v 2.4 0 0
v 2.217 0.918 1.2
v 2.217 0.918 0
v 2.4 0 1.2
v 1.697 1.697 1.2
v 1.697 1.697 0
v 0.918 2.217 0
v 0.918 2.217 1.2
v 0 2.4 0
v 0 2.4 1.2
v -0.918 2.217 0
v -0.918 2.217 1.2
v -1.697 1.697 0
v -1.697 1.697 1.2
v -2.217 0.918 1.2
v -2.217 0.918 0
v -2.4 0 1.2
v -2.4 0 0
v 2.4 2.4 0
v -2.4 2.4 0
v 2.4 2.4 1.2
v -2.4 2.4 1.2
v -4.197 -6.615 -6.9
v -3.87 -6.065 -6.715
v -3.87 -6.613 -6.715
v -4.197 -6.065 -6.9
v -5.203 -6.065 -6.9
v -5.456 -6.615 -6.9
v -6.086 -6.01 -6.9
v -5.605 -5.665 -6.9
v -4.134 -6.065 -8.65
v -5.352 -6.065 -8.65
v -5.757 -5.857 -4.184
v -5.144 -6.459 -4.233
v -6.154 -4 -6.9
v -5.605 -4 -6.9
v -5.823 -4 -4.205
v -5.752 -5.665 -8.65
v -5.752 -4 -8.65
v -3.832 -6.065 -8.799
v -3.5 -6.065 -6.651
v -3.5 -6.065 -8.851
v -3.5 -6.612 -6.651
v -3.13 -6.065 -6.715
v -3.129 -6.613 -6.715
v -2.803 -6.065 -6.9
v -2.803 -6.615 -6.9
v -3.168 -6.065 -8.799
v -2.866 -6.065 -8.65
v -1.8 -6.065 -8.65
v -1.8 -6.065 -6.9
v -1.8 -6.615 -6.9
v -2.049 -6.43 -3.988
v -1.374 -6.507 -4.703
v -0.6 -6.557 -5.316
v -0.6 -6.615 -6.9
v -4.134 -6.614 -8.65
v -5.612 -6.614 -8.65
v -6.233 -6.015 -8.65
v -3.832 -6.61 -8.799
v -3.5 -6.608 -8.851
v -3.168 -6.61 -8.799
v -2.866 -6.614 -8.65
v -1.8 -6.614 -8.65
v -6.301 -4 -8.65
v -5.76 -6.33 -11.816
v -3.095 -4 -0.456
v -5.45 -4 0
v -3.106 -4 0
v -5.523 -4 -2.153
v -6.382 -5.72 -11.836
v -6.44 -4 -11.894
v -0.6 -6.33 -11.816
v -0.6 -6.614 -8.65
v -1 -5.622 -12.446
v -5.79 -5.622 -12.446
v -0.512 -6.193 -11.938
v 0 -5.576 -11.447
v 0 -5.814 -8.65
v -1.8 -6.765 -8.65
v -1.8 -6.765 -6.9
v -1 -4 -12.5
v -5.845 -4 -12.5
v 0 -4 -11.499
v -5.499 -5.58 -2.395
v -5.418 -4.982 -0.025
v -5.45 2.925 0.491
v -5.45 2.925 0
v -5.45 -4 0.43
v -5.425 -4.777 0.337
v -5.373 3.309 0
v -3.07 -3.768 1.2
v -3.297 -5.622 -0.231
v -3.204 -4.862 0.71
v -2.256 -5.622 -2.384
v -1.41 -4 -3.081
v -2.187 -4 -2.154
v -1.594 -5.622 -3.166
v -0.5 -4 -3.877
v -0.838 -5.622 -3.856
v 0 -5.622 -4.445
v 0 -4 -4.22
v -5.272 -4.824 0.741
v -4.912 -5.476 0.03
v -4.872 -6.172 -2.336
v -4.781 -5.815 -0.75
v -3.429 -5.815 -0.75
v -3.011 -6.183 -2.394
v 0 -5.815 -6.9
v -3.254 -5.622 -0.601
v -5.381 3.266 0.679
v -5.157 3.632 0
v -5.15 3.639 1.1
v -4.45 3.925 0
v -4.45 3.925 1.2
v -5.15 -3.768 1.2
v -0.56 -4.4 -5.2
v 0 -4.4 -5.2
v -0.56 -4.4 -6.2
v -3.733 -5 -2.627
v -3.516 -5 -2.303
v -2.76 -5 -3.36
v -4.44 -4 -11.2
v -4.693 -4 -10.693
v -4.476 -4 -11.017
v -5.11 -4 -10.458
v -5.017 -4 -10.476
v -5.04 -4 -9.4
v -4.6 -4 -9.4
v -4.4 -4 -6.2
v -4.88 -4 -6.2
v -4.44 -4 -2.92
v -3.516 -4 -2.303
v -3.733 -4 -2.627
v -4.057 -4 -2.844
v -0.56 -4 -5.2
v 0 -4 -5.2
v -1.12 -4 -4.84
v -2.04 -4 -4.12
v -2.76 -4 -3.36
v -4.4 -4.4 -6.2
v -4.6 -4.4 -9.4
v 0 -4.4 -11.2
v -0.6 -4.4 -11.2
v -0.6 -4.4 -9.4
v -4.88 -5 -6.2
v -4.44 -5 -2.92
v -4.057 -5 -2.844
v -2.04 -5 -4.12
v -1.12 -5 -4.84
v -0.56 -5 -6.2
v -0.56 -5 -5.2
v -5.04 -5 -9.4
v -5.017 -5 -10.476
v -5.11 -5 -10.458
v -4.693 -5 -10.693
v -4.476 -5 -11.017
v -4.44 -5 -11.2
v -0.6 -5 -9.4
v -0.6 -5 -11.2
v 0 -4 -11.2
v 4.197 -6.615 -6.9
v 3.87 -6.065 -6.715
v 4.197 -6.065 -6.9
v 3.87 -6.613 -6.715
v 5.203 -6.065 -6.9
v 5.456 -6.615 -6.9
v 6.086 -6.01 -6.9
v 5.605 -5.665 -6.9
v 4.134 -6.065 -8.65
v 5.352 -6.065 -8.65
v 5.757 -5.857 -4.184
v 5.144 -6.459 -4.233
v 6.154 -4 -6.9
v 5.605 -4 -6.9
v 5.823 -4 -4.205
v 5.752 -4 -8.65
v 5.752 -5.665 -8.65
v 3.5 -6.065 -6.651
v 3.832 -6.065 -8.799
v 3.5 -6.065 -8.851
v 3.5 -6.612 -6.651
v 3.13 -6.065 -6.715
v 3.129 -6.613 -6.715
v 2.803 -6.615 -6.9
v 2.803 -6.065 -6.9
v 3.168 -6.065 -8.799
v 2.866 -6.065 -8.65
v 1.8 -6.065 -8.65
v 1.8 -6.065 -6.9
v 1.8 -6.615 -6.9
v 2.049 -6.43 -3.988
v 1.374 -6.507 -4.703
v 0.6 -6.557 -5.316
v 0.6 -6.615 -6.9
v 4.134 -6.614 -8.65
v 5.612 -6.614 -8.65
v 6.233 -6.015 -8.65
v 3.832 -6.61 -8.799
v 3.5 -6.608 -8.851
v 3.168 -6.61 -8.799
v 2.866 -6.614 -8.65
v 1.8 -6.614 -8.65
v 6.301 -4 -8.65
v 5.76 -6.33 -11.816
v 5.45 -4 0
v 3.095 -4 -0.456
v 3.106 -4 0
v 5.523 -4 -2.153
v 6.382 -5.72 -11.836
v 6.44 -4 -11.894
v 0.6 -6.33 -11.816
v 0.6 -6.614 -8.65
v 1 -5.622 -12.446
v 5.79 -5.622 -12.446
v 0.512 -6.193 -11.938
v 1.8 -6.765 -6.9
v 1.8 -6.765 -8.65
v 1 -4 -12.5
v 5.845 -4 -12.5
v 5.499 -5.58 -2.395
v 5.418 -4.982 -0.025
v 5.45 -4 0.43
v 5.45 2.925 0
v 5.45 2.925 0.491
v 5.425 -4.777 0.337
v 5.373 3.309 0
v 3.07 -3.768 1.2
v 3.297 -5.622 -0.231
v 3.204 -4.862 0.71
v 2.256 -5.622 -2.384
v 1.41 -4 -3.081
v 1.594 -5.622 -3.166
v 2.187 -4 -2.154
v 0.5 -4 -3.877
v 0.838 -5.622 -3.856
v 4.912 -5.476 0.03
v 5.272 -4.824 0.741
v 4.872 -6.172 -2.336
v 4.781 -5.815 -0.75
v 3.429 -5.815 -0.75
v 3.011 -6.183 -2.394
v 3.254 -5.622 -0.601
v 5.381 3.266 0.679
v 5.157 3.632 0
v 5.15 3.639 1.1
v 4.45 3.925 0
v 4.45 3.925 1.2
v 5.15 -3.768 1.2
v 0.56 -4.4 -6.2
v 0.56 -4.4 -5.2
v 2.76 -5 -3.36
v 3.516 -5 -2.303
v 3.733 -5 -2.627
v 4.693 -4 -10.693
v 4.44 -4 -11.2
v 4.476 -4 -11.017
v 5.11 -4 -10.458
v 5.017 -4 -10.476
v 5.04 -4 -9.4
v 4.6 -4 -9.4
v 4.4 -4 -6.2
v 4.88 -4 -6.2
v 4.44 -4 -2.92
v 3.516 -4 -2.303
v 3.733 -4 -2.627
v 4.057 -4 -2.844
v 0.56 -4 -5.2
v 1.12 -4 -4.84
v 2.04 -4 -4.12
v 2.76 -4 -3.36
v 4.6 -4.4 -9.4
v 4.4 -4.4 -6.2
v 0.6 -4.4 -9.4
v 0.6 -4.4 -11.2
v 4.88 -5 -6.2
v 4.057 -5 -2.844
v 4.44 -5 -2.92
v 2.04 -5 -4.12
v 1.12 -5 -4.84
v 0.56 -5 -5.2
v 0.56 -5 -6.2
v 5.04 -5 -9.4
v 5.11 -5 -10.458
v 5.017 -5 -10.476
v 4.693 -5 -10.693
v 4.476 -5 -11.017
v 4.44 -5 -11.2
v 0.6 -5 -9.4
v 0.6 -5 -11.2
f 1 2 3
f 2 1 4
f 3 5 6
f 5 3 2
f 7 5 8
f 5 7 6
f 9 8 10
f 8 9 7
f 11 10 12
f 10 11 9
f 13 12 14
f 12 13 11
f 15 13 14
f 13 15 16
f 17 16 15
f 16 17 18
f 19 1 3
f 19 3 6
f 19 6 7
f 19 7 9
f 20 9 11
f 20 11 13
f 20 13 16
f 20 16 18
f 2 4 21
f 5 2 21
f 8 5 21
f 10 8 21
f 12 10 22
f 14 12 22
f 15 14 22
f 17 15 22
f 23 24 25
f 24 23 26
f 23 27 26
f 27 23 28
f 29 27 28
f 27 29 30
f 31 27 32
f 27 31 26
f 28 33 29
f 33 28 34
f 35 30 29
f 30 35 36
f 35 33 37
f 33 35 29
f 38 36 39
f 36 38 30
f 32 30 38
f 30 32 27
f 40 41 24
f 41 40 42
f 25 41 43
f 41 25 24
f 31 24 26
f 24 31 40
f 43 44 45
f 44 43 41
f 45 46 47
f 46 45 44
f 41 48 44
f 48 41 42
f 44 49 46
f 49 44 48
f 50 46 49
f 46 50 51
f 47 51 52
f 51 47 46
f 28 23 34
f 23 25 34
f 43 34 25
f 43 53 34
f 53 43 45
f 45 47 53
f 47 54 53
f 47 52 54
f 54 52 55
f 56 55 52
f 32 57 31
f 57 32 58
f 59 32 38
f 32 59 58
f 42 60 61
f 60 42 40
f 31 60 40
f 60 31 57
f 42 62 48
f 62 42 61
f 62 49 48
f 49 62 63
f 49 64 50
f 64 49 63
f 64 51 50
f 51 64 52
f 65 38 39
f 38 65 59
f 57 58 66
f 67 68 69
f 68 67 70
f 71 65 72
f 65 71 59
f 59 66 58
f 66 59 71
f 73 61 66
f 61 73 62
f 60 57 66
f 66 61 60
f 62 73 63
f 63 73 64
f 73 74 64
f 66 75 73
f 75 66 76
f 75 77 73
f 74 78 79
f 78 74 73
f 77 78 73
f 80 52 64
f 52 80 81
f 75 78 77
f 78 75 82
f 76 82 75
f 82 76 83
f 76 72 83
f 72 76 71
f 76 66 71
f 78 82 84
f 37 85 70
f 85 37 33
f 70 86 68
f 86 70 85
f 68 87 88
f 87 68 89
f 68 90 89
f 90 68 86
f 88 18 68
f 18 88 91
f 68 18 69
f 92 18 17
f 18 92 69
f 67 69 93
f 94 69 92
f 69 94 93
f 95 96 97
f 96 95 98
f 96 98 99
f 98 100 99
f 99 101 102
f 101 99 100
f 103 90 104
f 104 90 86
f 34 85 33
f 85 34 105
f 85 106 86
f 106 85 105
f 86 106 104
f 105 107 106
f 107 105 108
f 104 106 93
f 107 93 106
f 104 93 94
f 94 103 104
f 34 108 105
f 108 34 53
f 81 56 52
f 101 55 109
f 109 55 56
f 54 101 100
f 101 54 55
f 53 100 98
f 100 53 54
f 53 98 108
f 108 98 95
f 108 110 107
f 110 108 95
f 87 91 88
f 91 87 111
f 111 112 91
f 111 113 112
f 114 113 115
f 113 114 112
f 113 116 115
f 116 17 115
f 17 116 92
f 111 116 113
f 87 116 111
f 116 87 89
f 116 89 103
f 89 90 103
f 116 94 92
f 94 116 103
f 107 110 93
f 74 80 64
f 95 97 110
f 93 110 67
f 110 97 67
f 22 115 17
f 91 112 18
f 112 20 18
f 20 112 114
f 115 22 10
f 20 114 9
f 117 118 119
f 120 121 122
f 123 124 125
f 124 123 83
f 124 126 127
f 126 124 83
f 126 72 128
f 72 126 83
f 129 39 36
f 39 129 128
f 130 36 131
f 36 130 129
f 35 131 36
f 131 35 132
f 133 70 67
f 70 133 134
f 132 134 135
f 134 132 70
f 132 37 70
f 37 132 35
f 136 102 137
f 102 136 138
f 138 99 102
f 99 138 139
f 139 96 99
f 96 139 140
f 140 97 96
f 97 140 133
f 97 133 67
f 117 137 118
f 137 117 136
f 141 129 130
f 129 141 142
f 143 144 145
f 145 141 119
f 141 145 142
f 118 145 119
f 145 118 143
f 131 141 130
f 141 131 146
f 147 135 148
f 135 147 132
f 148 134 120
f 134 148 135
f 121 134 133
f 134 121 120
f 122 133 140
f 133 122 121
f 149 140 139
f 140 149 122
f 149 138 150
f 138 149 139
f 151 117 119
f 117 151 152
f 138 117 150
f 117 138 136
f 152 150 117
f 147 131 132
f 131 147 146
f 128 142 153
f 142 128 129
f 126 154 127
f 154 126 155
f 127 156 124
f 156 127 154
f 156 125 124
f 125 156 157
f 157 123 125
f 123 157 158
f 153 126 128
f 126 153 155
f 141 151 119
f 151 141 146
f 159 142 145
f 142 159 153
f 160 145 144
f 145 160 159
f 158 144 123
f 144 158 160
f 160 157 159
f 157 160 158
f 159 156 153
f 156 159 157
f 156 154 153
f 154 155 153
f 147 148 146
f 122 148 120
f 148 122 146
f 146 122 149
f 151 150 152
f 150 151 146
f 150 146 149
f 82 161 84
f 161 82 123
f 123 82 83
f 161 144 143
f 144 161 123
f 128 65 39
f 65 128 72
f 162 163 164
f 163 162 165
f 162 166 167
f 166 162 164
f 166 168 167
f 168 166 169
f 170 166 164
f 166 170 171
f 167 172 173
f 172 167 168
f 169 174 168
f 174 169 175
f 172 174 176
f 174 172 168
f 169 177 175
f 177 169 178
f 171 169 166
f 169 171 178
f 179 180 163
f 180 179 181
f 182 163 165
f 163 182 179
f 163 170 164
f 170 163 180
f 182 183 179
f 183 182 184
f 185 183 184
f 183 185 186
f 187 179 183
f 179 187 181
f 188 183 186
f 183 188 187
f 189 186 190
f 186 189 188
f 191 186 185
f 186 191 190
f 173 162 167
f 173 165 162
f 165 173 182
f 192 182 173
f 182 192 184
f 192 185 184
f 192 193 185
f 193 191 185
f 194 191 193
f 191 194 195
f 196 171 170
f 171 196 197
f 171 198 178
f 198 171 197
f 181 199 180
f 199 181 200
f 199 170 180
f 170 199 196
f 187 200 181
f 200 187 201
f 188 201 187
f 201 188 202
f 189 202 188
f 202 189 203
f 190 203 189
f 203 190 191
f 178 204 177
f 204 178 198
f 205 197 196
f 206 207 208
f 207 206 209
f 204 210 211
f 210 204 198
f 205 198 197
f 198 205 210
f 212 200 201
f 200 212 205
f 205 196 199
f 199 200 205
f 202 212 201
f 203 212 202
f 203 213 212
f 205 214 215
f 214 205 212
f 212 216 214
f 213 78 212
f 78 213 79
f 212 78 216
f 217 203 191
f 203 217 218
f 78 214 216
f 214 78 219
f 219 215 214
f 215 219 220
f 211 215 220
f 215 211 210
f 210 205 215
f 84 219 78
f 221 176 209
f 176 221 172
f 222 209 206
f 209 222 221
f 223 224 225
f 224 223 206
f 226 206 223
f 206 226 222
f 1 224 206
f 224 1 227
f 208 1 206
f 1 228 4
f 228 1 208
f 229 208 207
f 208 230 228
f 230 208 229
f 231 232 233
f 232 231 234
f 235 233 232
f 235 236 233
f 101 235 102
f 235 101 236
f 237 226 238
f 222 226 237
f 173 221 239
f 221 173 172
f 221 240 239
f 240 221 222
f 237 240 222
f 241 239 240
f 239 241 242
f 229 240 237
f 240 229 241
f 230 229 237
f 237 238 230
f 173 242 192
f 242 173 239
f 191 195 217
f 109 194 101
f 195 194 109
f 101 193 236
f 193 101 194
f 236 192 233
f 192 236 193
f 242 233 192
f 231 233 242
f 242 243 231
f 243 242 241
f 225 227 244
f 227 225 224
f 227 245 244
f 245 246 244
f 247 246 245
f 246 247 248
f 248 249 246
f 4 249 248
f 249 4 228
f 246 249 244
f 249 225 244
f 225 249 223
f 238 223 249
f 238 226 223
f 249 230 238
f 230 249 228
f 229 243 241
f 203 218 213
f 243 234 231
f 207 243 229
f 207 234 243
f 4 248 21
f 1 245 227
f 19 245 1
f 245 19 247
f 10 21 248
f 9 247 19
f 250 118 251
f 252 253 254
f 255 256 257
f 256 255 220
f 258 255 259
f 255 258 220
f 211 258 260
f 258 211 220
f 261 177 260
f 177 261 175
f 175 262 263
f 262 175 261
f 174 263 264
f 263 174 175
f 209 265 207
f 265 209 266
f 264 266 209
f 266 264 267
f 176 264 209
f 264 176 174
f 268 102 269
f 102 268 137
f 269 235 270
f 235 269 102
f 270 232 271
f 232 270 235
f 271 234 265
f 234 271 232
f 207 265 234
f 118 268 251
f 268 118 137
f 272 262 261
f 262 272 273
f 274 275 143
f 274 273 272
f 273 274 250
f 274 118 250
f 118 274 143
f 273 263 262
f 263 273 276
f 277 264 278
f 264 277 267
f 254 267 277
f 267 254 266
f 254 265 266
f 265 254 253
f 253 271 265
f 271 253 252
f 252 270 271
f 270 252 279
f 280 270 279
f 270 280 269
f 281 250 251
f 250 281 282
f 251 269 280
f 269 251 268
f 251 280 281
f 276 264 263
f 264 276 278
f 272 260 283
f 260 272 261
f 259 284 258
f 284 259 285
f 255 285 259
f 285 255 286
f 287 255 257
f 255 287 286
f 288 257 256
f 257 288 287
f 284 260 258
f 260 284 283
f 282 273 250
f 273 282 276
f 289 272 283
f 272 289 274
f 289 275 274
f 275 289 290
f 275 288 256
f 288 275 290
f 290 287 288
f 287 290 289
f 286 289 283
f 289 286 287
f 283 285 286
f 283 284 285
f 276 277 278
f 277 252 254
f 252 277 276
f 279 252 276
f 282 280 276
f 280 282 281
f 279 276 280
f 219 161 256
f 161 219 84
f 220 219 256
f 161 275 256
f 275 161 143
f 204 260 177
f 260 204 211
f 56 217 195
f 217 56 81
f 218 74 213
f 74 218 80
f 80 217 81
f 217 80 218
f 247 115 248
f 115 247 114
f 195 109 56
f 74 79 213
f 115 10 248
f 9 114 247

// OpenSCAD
use <../lib.scad>
use <../p/2-4cylo.scad>
use <../p/2-4ndis.scad>
use <../p/rect2p.scad>
use <s/97895s01.scad>
function ldraw_lib__97895() = [
// 0 Minifig Life Jacket
// 0 Name: 97895.dat
// 0 Author: Evert-Jan Boer [ejboer]
// 0 !LDRAW_ORG Part UPDATE 2024-08
// 0 !LICENSE Licensed under CC BY 4.0 : see CAreadme.txt
// 
// 0 BFC CERTIFY CCW
  [0,"BFC","CERTIFY"],
  [0,"BFC","CCW"],
// 
// 0 !CATEGORY Minifig Neckwear
// 
// 0 !HISTORY 2013-08-14 {LEGO Digital Designer} Original part shape
// 0 !HISTORY 2021-02-26 [ejboer] File preparation for LDraw Parts Tracker
// 0 !HISTORY 2024-09-30 [OrionP] Official Update 2024-08
// 
// 
// 0 BFC INVERTNEXT
  [0,"BFC","INVERTNEXT"],
// 
// 1 16 0 0 0 6 0 0 0 -3 0 0 0 6 2-4cylo.dat
  [1,16,0,0,0,6,0,0,0,-3,0,0,0,6, ldraw_lib__2_4cylo()],
// 1 16 0 0 0 6 0 0 0 -1 0 0 0 6 2-4ndis.dat
  [1,16,0,0,0,6,0,0,0,-1,0,0,0,6, ldraw_lib__2_4ndis()],
// 1 16 0 -3 0 6 0 0 0 1 0 0 0 6 2-4ndis.dat
  [1,16,0,-3,0,6,0,0,0,1,0,0,0,6, ldraw_lib__2_4ndis()],
// 
// 1 16 0 0 0 1 0 0 0 1 0 0 0 1 s\97895s01.dat
  [1,16,0,0,0,1,0,0,0,1,0,0,0,1, ldraw_lib__s__97895s01()],
// 1 16 0 0 0 -1 0 0 0 1 0 0 0 1 s\97895s01.dat
  [1,16,0,0,0,-1,0,0,0,1,0,0,0,1, ldraw_lib__s__97895s01()],
// 
// 4 16 4.5 17.25 -16.913 1.5 17.25 -16.537 -1.5 17.25 -16.537 -4.5 17.25 -16.913
  [4,16,4.5,17.25,-16.913,1.5,17.25,-16.537,-1.5,17.25,-16.537,-4.5,17.25,-16.913],
// 4 16 1.5 21.625 -16.536 4.5 21.625 -16.913 -4.5 21.625 -16.913 -1.5 21.625 -16.536
  [4,16,1.5,21.625,-16.536,4.5,21.625,-16.913,-4.5,21.625,-16.913,-1.5,21.625,-16.536],
// 1 16 0 19.4375 -16.913 4.5 0 0 0 0 -2.1875 0 1 0 rect2p.dat
  [1,16,0,19.4375,-16.913,4.5,0,0,0,0,-2.1875,0,1,0, ldraw_lib__rect2p()],
// 1 16 0 -1.5 9.812 11.125 0 0 0 0 1.5 0 -1 0 rect2p.dat
  [1,16,0,-1.5,9.812,11.125,0,0,0,0,1.5,0,-1,0, ldraw_lib__rect2p()],
// 3 16 1.5 17.25 -16.537 0 17.25 -14.537 -1.5 17.25 -16.537
  [3,16,1.5,17.25,-16.537,0,17.25,-14.537,-1.5,17.25,-16.537],
// 3 16 -1.5 21.625 -16.536 0 21.625 -14.535 1.5 21.625 -16.536
  [3,16,-1.5,21.625,-16.536,0,21.625,-14.535,1.5,21.625,-16.536],
// 3 16 -11.125 -3 9.812 0 -3 6 11.125 -3 9.812
  [3,16,-11.125,-3,9.812,0,-3,6,11.125,-3,9.812],
// 3 16 0 0 6 -11.125 0 9.812 11.125 0 9.812
  [3,16,0,0,6,-11.125,0,9.812,11.125,0,9.812],
// 
// 2 24 0 21.625 -14.535 0 28.617 -13.941
  [2,24,0,21.625,-14.535,0,28.617,-13.941],
// 2 24 0 10.549 -10 0 11.112 -14.056
  [2,24,0,10.549,-10,0,11.112,-14.056],
// 2 24 0 28.617 -13.941 0 28.748 -10
  [2,24,0,28.617,-13.941,0,28.748,-10],
// 2 24 0 11.112 -14.056 0 17.25 -14.537
  [2,24,0,11.112,-14.056,0,17.25,-14.537],
];
module ldraw_lib__97895(step=0, col=false, unit=2/5, alt=false, line=0.2, solid=!$preview)
    makepoly(ldraw_lib__97895(), step=step, col=col, unit=unit, alt=alt, line=line, solid=solid);
ldraw_lib__97895(line=0.2);
